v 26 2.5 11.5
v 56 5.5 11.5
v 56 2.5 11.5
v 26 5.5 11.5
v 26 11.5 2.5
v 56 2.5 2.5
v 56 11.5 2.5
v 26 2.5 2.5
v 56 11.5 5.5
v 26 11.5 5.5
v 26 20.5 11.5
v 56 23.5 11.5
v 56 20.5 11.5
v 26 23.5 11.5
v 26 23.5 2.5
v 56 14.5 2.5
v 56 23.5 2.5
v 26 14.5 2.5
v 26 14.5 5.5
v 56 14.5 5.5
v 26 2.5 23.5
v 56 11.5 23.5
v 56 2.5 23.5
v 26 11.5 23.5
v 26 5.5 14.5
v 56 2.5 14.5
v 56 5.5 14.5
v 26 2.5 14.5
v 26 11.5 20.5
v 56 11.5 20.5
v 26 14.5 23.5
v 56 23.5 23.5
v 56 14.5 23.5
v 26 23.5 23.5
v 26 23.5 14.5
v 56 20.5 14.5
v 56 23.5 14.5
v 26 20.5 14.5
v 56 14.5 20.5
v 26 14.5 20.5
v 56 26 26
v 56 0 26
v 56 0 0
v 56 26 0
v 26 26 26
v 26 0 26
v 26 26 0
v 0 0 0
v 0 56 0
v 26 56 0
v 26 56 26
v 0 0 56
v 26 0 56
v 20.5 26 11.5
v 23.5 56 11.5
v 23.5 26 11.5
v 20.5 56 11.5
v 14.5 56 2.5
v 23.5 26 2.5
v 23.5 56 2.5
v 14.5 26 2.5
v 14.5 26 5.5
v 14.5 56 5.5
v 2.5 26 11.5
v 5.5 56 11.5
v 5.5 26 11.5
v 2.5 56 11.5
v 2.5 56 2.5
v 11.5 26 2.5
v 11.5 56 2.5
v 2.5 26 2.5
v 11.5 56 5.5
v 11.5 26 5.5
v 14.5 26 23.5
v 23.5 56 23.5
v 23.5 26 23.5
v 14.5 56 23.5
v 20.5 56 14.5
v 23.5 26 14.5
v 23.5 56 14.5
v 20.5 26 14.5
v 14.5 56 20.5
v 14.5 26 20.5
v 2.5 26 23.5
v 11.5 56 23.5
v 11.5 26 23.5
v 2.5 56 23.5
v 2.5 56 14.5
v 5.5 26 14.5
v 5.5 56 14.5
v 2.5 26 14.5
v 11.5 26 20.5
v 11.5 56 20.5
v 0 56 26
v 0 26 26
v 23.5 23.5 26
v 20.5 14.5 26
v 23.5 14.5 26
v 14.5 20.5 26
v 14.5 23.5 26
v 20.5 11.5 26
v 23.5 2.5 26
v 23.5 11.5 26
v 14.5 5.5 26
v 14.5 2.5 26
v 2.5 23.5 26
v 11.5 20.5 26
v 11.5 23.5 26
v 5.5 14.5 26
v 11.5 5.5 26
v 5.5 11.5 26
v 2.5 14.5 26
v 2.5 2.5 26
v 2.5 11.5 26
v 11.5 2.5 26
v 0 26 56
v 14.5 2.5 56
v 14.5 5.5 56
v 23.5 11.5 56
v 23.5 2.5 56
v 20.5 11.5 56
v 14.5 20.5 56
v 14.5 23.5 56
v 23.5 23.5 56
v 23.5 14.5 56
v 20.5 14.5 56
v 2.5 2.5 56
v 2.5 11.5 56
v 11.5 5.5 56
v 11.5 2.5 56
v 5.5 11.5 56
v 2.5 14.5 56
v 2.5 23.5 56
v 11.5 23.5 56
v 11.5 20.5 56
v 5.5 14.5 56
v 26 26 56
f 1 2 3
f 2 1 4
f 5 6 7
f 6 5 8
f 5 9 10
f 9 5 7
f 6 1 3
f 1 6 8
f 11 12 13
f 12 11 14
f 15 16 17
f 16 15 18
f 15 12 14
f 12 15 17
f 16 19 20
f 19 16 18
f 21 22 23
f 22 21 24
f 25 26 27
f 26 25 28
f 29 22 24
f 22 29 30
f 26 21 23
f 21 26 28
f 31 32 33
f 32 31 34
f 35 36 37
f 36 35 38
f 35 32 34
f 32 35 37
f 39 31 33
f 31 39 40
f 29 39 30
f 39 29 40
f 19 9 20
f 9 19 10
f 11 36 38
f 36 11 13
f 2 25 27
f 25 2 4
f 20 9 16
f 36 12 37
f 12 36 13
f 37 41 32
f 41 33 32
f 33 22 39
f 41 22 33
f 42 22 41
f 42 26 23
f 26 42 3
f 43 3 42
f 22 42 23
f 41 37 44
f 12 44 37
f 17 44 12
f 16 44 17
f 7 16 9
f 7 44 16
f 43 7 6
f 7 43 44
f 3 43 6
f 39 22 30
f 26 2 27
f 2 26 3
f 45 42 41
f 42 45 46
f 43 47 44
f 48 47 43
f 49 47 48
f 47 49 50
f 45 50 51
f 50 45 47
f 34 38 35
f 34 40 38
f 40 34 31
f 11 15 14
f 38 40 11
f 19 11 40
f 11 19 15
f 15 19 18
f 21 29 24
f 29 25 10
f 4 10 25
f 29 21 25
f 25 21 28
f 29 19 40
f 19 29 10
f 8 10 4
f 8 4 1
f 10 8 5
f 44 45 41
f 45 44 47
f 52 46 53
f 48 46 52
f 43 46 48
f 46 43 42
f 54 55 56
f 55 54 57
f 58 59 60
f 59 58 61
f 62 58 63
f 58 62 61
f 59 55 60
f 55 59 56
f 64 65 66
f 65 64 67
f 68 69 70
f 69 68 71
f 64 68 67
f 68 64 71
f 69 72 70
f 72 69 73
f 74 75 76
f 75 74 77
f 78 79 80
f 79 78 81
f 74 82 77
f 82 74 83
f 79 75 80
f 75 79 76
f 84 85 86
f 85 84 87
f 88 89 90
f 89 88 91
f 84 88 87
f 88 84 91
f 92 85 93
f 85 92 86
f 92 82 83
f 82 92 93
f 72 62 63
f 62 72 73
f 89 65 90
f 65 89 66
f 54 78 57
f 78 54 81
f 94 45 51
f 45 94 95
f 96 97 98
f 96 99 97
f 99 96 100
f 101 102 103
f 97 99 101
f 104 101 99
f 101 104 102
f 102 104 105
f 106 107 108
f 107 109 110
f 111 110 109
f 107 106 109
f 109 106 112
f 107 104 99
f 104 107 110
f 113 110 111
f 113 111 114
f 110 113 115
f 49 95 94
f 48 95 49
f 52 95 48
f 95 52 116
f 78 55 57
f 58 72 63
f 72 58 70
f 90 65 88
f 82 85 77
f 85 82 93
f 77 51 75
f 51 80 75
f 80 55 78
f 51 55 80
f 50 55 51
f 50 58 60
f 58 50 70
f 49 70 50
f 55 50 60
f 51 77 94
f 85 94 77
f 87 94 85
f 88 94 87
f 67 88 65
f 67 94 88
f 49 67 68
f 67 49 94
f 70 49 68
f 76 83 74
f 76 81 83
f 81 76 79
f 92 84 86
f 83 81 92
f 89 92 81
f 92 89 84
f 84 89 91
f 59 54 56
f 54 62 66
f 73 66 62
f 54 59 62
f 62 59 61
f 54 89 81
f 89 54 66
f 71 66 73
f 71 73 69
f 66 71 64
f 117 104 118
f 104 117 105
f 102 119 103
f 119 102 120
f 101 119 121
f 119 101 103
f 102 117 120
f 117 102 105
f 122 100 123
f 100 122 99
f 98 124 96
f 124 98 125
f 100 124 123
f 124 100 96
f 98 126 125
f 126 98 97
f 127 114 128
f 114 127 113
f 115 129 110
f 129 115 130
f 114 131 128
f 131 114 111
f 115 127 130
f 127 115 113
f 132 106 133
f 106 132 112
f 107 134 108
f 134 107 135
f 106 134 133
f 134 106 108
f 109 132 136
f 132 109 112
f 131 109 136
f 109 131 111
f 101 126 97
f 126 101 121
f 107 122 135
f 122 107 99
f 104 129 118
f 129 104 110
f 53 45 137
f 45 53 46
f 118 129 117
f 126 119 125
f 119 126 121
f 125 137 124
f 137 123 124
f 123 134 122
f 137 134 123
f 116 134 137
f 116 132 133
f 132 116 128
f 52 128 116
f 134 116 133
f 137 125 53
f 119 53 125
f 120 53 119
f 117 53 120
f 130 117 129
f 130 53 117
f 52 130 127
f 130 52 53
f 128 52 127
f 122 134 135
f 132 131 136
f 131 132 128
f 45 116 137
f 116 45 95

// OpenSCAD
// file: modules_coin_0_3.scad
module tube_profile(longueur, epaisseur_bloc = 3, largeur_bloc = 6, largeur_profile = 20)
{
    ecart = (largeur_profile - largeur_bloc)/2;

    translate([-1,0,0])
    #cube([longueur+2,ecart,ecart]);
    
    translate([-1,ecart+largeur_bloc,0])
    #cube([longueur+2,ecart,ecart]);
    
    translate([-1,0,ecart+largeur_bloc])
    #cube([longueur+2,ecart,ecart]);
    
    translate([-1,ecart+largeur_bloc,ecart+largeur_bloc])
    #cube([longueur+2,ecart,ecart]);
    
    translate([-1,epaisseur_bloc,epaisseur_bloc])
    #cube([longueur+2,largeur_profile-2*epaisseur_bloc,largeur_profile-2*epaisseur_bloc]);
}
// main file
include <modules_coin_0_3.scad>

longueur_tube = 30;
largeur_tube = 26;
largeur_profile = 21;

epaisseur_bloc = 3;
longueur_bloc = 6;

epaisseur_tube = (largeur_tube-largeur_profile)/2;

union()
{
    color("green")
    cube(largeur_tube);
    
    difference()
    {
        color("blue")
        translate([largeur_tube,0,0])
        cube([longueur_tube,largeur_tube,largeur_tube]);
        
        color("red")
        translate([largeur_tube,epaisseur_tube,epaisseur_tube])
        tube_profile(longueur_tube+1, epaisseur_bloc, epaisseur_bloc, largeur_profile);
    }
  
    difference()
    {
        color("blue")
        translate([0,largeur_tube,0])
        cube([largeur_tube,longueur_tube,largeur_tube]);
    
        color("red")
        translate([largeur_tube-epaisseur_tube,largeur_tube,epaisseur_tube])
        rotate([0,0,90])
        tube_profile(longueur_tube+1, epaisseur_bloc, epaisseur_bloc, largeur_profile);
    }
    
    difference()
    {
        color("blue")
        translate([0,0,largeur_tube])
        cube([largeur_tube,largeur_tube,longueur_tube]);
        
        color("red")
        translate([largeur_tube-epaisseur_tube,epaisseur_tube,largeur_tube])
        rotate([0,-90,0])
        tube_profile(longueur_tube+1, epaisseur_bloc, epaisseur_bloc, largeur_profile);
    }
}
